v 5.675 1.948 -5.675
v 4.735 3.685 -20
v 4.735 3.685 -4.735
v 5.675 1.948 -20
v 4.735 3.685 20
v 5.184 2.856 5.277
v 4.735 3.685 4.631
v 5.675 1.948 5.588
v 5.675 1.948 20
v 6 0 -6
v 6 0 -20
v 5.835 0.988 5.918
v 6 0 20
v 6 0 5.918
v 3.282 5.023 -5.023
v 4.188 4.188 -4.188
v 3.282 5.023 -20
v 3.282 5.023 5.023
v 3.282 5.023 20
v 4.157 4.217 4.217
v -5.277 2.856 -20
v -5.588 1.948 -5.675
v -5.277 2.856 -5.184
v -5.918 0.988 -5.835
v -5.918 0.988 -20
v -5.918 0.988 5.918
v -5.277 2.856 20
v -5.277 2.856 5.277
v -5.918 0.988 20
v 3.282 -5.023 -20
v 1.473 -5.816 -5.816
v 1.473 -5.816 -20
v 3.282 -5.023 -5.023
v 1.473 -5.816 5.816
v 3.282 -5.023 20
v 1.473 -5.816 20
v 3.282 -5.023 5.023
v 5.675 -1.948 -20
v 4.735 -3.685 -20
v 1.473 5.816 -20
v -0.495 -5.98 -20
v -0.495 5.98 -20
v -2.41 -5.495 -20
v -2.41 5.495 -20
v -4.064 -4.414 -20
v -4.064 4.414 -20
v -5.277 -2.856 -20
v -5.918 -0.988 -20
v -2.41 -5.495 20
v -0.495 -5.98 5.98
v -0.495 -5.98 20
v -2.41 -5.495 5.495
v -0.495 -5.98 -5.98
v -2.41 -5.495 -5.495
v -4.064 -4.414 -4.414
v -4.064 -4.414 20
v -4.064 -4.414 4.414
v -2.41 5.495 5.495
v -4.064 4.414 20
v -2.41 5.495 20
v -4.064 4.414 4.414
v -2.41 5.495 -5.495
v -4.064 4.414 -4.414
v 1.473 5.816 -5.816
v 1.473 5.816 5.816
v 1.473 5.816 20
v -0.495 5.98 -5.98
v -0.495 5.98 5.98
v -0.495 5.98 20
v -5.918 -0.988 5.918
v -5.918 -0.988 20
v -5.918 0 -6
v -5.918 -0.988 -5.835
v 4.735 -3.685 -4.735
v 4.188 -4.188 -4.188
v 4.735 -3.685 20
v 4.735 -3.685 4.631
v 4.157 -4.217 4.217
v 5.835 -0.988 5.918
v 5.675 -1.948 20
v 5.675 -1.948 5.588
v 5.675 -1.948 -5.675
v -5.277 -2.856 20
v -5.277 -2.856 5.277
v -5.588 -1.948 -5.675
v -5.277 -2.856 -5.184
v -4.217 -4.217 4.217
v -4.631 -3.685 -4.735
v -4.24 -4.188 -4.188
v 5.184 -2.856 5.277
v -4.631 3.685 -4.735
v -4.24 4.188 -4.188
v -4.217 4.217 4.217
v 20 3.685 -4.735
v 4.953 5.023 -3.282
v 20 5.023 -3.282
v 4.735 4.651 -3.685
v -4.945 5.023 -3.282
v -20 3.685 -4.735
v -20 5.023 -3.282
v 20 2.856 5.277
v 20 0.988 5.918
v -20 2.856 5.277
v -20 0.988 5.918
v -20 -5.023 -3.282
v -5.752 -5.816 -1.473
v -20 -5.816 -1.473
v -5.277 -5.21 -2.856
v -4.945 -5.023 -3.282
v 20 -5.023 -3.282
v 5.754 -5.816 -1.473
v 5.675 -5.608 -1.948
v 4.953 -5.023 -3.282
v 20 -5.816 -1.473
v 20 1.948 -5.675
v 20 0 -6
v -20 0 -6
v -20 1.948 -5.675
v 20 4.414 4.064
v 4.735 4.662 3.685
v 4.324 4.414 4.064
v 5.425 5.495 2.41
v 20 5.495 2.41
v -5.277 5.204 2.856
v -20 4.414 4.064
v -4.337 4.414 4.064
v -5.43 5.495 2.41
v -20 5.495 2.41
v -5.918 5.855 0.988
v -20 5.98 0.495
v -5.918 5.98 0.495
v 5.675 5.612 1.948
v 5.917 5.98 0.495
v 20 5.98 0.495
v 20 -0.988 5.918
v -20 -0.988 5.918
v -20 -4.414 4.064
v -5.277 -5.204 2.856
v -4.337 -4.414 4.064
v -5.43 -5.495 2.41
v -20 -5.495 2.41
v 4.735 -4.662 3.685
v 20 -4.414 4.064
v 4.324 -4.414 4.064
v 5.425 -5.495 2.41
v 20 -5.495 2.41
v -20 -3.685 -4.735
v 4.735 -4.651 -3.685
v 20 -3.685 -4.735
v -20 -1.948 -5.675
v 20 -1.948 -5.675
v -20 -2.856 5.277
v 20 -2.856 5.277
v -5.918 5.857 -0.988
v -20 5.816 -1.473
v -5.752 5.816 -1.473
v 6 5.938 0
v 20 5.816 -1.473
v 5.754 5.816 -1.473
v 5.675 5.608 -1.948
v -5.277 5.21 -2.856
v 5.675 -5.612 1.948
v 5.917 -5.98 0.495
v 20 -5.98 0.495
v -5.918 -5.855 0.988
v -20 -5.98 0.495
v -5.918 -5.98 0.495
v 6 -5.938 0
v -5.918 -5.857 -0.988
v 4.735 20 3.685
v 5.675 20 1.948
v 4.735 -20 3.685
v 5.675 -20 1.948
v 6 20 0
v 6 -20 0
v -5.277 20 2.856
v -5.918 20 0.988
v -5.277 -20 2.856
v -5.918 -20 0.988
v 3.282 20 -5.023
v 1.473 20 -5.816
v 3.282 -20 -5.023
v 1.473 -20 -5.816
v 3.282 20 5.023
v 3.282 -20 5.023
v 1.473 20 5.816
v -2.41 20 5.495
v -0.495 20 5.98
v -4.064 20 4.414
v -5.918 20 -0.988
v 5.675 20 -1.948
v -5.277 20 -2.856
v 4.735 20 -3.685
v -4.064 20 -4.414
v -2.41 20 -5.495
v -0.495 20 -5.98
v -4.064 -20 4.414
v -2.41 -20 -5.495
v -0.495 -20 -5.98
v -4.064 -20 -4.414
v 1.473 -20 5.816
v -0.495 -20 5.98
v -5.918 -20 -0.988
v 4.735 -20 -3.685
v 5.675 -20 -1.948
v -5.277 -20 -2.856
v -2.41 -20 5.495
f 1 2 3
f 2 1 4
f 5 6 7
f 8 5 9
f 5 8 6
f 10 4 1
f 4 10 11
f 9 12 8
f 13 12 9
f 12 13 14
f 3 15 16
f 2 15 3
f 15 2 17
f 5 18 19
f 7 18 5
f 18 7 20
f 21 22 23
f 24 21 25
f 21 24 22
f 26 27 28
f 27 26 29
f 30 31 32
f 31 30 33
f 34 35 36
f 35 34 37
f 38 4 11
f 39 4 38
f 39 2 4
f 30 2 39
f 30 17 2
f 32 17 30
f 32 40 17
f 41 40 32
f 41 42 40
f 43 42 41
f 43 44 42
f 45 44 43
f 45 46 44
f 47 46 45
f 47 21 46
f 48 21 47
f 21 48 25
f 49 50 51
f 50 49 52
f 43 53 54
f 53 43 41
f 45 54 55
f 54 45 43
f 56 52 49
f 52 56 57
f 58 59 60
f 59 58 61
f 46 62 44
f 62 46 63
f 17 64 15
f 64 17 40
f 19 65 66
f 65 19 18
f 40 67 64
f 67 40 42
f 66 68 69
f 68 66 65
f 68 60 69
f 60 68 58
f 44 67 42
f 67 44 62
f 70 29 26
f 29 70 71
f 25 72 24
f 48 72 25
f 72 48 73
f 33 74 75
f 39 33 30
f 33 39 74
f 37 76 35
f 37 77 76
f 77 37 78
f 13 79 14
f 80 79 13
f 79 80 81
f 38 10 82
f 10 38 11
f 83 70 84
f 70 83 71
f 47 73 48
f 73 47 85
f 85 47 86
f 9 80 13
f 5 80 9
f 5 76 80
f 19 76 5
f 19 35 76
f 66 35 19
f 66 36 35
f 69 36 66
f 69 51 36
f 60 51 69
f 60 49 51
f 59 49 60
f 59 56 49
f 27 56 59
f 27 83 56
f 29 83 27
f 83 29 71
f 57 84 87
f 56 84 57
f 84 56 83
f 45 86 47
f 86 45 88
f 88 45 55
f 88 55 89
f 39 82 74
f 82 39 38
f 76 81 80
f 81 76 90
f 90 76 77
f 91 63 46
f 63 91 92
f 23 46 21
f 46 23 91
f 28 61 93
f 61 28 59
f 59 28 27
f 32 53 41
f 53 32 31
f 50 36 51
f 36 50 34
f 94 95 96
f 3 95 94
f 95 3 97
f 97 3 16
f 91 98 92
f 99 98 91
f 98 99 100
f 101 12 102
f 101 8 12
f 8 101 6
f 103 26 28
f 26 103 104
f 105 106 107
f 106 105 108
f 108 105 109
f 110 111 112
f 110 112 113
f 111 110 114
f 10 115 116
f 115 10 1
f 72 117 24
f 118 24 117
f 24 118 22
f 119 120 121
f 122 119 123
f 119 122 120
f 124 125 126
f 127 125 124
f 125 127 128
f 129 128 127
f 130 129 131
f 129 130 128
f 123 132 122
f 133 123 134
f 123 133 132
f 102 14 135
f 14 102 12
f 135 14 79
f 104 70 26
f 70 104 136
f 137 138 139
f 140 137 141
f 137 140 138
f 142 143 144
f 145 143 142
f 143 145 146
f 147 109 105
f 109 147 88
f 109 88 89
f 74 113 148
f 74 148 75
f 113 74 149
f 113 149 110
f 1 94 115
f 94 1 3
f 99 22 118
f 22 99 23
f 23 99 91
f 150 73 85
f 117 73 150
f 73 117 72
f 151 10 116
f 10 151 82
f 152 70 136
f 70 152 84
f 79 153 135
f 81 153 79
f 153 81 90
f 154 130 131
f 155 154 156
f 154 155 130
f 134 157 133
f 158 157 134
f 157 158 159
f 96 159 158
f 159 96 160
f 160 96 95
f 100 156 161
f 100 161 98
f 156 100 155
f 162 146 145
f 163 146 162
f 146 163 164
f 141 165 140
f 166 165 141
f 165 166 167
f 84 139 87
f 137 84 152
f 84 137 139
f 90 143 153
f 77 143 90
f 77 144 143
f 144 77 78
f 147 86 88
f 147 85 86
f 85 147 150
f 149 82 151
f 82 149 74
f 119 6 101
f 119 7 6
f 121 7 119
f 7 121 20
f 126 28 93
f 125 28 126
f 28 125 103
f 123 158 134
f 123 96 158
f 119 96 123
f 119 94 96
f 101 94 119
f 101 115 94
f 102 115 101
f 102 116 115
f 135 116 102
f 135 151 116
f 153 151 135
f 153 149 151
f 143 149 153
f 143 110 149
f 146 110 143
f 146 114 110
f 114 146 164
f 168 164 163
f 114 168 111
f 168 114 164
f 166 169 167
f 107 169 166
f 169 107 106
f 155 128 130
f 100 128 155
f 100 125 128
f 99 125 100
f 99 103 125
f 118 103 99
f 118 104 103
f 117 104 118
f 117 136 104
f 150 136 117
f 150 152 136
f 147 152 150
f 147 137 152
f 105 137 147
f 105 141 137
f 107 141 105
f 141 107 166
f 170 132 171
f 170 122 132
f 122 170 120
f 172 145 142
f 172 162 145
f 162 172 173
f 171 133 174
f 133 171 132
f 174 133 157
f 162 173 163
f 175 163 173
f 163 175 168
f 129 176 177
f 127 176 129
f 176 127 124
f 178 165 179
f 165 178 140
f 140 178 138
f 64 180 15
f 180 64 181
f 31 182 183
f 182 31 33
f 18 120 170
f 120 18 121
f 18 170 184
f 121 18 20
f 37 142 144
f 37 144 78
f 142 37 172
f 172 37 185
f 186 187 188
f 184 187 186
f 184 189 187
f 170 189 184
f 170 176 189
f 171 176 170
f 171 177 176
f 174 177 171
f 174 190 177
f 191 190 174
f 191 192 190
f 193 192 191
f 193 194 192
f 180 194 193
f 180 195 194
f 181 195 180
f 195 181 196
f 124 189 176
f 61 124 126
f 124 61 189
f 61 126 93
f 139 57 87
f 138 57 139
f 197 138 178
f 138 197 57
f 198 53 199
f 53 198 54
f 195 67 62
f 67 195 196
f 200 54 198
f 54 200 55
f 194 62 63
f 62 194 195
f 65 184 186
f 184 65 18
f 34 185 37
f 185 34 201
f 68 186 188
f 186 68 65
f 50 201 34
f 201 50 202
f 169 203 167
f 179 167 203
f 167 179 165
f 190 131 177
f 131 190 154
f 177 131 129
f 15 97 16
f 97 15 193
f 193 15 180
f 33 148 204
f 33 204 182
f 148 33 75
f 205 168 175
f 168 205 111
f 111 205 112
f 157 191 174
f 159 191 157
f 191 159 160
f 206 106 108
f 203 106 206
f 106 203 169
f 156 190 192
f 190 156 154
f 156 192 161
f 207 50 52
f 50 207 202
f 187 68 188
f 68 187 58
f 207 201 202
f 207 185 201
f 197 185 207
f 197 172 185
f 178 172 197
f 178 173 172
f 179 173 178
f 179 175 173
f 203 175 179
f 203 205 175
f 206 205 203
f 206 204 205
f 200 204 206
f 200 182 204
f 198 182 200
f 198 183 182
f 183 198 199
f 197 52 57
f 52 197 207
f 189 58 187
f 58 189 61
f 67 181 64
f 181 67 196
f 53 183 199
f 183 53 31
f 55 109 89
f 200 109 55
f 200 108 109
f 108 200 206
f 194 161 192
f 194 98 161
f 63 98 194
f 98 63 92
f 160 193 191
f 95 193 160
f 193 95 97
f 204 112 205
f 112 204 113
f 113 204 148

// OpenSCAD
FNSET = 0; $fn = FNSET;
union() {
    cylinder(d = 12, h = 40, center = true);
    rotate([0, 90, 0]) cylinder(d = 12, h = 40, center = true);
    rotate([90, 0, 0]) cylinder(d = 12, h = 40, center = true);
}
